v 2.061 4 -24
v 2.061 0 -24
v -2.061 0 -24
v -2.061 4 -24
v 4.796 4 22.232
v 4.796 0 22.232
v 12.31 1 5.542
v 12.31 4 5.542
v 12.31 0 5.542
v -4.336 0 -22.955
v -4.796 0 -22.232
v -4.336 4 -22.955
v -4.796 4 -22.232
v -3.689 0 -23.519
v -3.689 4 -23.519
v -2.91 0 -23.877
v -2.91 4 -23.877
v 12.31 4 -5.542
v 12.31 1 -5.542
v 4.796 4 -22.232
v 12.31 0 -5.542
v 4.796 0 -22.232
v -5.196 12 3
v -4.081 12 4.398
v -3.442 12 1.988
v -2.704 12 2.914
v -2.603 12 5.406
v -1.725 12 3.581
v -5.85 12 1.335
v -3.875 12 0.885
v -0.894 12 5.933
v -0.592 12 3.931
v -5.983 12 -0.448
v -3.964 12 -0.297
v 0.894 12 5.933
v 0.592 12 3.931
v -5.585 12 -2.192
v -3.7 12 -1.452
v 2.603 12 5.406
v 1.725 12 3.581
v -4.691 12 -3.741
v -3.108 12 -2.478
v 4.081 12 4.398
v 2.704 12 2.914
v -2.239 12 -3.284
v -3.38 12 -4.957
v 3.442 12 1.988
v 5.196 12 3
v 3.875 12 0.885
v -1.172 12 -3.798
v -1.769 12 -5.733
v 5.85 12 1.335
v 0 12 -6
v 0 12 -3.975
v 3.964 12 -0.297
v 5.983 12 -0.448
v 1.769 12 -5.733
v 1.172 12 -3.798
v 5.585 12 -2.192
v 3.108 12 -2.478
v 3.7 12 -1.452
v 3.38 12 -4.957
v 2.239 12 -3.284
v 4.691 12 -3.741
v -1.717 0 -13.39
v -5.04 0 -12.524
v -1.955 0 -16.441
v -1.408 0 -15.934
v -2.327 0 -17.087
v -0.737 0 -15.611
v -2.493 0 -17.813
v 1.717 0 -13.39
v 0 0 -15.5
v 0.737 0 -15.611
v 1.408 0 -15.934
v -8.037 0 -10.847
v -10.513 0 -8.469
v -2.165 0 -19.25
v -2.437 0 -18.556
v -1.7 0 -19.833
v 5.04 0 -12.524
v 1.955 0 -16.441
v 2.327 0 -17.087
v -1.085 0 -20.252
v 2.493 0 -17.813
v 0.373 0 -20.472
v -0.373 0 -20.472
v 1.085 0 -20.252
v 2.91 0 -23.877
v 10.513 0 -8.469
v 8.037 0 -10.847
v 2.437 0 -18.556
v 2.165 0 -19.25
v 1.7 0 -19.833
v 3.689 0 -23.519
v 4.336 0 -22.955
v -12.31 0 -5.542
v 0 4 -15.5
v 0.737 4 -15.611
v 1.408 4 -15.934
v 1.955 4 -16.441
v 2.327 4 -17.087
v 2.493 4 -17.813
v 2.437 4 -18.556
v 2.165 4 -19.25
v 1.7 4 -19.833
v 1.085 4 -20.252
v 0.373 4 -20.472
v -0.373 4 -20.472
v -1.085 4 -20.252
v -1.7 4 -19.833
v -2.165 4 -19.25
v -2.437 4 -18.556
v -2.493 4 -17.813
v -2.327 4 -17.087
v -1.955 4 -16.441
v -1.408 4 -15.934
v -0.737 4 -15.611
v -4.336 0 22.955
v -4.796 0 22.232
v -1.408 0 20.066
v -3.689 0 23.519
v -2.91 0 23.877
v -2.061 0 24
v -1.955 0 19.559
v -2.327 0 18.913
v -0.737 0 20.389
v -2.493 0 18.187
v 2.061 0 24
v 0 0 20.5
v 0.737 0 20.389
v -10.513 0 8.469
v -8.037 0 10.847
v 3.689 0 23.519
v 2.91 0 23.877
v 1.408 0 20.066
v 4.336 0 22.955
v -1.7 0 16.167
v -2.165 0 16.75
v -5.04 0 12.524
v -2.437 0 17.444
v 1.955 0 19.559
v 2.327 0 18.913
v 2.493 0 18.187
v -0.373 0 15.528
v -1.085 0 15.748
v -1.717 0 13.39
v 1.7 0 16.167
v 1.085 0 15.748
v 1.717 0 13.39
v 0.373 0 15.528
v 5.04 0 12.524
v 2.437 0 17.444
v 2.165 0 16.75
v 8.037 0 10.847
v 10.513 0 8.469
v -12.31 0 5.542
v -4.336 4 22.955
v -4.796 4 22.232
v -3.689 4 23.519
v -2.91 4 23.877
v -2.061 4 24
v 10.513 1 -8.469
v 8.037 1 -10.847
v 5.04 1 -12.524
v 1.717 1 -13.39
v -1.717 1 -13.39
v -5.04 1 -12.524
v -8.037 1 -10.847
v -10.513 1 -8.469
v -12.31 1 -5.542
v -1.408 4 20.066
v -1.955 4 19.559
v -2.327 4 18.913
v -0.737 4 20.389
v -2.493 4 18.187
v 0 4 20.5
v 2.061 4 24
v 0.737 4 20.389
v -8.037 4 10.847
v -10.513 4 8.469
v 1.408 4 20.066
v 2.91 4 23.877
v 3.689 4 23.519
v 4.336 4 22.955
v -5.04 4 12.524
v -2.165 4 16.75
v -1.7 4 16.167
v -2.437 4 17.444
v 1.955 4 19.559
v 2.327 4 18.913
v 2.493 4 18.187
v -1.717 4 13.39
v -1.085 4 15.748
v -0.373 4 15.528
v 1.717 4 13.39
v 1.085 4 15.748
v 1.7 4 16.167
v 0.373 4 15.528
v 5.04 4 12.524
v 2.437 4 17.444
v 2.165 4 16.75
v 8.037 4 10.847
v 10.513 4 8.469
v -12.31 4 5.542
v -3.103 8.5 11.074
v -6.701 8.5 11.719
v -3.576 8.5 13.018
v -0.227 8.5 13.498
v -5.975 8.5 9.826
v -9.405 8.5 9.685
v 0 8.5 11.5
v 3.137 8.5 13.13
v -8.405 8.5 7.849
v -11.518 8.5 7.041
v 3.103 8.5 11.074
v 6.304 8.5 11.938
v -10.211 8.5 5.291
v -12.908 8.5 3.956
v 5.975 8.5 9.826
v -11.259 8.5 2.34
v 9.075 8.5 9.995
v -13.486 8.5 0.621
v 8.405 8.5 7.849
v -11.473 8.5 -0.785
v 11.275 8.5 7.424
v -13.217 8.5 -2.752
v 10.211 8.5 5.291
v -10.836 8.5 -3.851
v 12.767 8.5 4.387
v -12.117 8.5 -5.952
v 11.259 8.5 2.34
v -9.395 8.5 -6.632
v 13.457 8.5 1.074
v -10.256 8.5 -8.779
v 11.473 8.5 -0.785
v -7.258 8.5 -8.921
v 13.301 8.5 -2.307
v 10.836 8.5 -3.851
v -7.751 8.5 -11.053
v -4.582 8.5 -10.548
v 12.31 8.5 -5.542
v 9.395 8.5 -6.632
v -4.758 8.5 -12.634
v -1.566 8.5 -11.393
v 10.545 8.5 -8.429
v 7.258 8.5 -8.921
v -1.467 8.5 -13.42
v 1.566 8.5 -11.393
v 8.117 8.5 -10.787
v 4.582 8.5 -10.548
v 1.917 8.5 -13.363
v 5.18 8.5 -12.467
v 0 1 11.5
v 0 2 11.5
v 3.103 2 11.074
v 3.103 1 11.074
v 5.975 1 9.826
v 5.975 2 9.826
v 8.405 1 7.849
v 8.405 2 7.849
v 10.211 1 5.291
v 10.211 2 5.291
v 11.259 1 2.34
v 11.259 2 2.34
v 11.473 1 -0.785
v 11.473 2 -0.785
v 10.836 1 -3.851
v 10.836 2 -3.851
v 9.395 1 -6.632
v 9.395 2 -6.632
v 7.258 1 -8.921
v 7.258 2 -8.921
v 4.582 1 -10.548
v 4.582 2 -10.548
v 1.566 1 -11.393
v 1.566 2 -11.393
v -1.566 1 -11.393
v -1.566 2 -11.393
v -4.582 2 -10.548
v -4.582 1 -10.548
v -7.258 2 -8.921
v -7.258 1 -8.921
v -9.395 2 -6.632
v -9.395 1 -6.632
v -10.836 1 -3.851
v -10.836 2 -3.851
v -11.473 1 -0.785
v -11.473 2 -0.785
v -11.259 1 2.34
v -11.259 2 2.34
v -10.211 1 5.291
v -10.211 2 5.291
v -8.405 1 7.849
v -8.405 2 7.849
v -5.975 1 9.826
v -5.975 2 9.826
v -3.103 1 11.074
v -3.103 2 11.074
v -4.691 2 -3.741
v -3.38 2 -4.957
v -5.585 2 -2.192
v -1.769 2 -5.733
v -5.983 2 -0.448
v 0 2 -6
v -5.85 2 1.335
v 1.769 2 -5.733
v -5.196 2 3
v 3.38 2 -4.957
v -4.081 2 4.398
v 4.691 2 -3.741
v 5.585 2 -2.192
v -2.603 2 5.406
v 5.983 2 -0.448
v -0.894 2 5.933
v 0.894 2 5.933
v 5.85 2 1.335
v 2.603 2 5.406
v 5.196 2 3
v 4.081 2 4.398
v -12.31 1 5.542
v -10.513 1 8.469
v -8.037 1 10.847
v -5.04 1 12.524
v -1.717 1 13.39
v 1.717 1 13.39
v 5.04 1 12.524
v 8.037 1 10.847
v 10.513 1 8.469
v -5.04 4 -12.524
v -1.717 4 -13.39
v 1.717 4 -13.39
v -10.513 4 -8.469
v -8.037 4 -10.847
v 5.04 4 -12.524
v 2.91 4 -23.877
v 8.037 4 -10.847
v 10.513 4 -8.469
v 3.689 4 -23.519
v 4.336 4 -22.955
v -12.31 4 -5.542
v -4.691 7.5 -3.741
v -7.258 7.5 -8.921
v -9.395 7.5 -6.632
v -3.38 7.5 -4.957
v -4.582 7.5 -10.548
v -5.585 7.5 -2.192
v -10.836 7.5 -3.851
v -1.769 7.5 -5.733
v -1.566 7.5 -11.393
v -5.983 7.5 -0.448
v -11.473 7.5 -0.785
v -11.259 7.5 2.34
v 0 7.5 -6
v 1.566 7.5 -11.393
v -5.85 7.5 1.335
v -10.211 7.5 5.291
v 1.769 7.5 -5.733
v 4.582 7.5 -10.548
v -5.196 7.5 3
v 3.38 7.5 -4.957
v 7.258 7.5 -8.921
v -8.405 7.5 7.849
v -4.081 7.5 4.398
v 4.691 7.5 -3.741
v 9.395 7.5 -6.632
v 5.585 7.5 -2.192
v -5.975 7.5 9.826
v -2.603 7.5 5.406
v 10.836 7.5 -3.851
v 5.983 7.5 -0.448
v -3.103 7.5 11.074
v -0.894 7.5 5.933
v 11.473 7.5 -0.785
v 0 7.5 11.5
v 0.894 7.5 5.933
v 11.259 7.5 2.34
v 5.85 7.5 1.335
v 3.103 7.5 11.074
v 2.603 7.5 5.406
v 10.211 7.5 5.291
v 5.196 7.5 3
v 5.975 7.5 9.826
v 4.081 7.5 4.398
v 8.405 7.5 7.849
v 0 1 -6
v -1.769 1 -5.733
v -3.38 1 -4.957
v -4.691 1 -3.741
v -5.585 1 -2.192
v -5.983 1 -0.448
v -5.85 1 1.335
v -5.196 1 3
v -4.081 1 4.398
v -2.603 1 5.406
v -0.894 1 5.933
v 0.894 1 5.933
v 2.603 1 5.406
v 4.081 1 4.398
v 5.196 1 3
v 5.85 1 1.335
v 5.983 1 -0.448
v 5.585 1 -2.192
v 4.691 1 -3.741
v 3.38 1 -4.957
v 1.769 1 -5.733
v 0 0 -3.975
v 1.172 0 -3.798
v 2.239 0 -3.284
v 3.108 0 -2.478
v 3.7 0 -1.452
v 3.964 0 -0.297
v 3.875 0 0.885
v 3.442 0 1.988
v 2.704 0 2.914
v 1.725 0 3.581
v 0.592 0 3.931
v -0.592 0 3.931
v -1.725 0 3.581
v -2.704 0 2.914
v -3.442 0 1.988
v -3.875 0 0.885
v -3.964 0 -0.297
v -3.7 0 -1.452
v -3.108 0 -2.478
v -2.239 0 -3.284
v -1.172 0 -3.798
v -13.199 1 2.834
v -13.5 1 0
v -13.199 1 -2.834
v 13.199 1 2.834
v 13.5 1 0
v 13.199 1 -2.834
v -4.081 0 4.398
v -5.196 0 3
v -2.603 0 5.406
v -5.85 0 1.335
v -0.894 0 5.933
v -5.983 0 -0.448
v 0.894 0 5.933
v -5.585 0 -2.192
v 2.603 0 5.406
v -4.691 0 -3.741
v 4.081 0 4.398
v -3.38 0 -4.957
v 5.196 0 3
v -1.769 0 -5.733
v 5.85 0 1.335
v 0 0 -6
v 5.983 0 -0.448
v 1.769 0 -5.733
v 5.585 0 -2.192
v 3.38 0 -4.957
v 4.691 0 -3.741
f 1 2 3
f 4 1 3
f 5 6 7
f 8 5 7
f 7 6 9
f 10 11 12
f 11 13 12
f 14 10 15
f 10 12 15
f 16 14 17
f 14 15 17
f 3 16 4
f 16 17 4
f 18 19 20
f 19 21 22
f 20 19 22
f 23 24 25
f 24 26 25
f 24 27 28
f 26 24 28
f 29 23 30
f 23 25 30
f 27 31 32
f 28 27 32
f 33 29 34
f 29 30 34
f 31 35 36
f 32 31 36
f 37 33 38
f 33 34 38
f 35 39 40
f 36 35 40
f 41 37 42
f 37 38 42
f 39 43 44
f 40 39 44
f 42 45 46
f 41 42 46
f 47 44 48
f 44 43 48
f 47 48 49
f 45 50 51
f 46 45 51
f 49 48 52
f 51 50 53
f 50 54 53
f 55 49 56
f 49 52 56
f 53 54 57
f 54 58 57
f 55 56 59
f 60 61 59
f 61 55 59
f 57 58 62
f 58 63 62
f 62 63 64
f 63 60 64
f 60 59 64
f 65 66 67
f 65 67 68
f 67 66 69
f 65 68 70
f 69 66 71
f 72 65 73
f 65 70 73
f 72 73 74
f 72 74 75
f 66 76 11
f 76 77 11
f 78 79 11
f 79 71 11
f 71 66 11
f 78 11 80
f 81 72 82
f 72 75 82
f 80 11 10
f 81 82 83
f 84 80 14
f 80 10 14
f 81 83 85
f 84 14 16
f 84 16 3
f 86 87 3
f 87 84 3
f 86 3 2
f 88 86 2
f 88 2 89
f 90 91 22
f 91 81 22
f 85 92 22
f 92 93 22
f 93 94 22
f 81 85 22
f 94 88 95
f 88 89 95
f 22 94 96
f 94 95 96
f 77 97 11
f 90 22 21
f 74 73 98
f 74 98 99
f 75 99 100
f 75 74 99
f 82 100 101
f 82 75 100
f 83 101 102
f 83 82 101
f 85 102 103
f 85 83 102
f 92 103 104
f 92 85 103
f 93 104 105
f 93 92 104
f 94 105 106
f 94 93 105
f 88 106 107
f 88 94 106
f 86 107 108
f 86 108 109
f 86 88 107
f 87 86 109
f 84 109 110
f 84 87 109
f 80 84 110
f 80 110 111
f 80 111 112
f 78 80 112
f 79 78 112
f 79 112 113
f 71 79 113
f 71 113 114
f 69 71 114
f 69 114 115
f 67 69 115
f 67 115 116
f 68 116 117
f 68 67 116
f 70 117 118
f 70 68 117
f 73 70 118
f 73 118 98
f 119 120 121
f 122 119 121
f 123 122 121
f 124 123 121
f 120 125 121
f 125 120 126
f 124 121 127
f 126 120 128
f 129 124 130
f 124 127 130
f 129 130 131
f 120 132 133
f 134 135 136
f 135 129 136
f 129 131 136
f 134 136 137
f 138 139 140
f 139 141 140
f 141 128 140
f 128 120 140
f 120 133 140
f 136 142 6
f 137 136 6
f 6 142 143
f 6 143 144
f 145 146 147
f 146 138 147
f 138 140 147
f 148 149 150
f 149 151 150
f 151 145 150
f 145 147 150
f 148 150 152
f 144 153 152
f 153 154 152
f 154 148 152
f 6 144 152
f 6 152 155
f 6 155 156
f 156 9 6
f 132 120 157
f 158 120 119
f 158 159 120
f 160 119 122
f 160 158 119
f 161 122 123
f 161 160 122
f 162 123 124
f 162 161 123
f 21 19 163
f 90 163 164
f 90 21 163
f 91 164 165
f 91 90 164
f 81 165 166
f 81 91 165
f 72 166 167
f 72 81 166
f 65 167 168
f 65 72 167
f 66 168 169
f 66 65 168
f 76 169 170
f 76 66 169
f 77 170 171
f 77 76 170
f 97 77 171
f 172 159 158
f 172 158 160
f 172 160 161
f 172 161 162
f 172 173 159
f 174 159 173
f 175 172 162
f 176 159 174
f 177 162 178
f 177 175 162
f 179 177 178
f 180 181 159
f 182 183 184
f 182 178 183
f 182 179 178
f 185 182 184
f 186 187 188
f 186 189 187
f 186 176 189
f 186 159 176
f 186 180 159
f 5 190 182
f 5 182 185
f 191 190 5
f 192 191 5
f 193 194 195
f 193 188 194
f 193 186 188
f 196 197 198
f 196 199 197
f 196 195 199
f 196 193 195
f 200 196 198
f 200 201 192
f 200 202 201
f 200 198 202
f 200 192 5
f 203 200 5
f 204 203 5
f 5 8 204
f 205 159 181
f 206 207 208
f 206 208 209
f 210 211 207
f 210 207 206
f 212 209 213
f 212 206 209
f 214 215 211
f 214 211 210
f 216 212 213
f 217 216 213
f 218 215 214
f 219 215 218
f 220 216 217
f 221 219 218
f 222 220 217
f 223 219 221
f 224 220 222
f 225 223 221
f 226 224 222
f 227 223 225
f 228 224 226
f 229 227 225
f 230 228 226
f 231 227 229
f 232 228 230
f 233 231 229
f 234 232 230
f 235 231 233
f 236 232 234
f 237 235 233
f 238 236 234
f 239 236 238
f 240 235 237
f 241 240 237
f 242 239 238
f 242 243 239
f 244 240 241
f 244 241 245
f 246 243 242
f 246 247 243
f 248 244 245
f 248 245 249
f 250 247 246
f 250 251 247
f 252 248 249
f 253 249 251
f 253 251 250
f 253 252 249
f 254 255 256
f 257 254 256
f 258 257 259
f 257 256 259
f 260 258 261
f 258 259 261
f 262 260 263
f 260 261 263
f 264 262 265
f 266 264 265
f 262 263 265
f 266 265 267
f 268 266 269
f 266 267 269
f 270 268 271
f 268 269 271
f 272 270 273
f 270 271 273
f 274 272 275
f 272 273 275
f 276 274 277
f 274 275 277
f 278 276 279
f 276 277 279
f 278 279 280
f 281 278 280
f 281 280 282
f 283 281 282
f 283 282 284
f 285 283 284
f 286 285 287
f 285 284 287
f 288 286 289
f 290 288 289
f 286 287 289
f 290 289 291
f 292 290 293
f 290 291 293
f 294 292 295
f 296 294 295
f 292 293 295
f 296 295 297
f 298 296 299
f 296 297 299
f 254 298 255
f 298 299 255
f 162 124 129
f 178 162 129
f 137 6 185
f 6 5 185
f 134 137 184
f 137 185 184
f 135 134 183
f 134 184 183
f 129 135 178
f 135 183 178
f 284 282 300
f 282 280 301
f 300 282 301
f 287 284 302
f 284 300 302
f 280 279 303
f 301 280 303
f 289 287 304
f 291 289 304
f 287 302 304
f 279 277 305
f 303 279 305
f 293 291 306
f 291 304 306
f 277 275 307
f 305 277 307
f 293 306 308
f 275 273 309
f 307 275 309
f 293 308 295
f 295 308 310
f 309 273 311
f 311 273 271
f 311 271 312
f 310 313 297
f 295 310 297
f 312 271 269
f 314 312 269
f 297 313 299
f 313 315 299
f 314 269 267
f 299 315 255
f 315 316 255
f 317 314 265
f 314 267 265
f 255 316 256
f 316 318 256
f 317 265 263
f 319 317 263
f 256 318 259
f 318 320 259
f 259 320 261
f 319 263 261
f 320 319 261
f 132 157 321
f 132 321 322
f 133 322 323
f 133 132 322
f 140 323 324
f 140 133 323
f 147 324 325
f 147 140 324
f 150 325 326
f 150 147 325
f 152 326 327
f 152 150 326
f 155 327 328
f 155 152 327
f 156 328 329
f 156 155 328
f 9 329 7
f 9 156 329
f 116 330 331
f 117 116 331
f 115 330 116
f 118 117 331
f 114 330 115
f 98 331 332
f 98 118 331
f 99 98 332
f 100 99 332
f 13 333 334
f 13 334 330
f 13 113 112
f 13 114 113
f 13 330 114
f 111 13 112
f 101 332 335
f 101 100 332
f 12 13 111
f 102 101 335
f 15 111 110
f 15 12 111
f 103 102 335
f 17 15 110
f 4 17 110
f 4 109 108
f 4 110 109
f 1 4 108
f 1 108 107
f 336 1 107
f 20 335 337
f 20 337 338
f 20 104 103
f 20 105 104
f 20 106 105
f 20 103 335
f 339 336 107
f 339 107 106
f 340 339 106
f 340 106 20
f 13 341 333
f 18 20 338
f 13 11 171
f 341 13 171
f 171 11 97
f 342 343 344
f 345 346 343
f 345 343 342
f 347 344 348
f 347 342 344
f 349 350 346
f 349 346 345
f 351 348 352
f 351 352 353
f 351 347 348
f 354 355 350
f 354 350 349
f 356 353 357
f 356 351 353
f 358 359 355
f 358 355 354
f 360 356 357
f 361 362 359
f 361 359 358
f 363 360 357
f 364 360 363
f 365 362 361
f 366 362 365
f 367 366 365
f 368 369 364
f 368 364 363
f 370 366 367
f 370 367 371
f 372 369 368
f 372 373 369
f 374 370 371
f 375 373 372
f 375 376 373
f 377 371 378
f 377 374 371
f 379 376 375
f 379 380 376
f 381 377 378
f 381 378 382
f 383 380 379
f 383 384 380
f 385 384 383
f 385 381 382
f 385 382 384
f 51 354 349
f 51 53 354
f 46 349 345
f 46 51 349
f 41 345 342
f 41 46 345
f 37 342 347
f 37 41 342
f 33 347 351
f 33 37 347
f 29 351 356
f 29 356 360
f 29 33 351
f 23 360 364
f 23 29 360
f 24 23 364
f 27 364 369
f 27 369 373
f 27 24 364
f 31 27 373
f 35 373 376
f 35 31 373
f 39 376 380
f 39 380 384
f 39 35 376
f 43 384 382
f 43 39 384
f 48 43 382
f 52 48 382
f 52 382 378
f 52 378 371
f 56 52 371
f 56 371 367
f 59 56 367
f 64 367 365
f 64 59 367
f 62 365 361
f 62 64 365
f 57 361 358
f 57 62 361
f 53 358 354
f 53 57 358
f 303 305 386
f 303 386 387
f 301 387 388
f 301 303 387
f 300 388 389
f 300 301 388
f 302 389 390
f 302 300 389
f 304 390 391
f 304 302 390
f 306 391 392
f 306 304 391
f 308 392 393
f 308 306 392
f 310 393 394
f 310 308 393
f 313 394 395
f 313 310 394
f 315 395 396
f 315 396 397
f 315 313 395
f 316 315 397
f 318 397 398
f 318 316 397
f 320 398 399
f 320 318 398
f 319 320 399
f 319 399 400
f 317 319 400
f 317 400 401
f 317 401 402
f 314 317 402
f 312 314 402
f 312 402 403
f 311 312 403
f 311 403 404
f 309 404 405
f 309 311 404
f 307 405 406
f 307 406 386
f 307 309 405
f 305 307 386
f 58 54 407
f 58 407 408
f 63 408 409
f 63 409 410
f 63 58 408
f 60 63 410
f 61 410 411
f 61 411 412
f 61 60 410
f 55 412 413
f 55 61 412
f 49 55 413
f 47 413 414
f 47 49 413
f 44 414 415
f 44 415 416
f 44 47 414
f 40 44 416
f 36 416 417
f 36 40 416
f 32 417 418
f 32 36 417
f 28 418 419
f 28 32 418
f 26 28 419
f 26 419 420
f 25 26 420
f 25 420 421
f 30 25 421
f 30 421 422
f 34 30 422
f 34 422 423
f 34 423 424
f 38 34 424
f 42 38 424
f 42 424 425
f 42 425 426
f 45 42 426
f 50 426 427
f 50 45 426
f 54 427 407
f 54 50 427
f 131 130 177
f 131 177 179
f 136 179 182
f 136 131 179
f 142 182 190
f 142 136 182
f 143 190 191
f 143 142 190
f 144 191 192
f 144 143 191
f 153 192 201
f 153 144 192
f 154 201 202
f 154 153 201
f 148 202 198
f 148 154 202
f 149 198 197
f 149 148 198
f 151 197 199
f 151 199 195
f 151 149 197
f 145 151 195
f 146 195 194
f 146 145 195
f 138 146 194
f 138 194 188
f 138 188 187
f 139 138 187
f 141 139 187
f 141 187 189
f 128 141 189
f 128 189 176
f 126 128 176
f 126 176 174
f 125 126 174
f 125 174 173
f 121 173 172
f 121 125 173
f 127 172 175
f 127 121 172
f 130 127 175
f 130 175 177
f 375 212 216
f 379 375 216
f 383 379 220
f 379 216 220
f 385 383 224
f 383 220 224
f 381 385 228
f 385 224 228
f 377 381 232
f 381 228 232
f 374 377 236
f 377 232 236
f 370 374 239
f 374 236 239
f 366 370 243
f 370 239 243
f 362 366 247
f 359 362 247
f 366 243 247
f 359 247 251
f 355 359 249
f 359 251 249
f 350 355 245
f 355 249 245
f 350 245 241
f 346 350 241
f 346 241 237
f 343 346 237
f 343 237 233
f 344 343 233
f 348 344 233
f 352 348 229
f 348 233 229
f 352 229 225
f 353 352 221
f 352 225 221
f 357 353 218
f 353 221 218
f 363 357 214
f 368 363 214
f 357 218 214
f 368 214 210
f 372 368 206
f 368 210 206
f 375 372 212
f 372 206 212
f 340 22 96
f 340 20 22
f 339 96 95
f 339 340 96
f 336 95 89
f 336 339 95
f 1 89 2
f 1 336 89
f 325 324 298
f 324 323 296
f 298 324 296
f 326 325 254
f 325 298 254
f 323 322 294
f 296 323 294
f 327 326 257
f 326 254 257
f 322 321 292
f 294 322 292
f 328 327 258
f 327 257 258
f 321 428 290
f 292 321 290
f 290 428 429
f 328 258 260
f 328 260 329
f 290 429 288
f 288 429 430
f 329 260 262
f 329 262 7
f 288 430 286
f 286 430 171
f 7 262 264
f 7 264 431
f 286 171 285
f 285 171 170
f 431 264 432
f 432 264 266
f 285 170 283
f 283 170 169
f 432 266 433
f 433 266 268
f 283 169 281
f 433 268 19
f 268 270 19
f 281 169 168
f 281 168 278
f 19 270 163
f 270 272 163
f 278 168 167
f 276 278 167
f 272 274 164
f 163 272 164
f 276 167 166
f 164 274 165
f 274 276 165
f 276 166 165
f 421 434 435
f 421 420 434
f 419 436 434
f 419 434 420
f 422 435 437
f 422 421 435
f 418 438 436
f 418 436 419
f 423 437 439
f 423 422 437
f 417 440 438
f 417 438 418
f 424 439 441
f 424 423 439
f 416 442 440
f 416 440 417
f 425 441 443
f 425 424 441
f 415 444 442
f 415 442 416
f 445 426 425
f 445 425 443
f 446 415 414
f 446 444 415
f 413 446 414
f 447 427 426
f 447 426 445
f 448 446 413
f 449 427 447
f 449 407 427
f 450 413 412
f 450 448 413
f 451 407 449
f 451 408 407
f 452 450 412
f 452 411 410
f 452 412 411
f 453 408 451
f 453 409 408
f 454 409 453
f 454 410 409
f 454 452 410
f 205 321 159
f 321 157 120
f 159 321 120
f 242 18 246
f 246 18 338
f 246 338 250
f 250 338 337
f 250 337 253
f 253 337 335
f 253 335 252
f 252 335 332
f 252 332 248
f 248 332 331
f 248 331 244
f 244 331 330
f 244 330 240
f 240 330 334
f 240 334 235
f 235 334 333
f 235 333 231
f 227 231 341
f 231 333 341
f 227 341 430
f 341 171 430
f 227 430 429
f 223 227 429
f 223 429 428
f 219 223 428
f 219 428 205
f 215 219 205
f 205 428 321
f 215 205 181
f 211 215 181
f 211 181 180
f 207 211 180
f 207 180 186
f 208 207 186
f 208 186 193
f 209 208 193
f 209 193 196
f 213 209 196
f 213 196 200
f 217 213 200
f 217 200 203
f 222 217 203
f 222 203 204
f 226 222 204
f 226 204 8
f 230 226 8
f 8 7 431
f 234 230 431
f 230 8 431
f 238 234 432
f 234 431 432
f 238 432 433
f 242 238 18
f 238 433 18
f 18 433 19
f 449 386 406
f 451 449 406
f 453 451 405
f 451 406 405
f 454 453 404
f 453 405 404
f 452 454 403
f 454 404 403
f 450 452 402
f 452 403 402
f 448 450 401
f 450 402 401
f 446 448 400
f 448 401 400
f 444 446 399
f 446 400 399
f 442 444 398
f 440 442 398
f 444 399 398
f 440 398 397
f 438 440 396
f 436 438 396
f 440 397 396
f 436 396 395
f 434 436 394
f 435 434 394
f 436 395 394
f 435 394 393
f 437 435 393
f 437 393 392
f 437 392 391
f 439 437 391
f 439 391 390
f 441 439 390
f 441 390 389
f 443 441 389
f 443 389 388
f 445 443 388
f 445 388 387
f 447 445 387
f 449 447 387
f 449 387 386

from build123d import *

# Parameters (mm, degrees)
SKETCH_1_R           = 2.5
SKETCH_1_R_2         = 13.5
SKETCH_1_R_3         = 4
EXTRUDE_1_DEPTH      = 4
SKETCH_1_3_R         = 13.5
SKETCH_1_3_R_2       = 4
EXTRUDE_2_DEPTH      = 8.5
SKETCH_1_5_R         = 13.5
SKETCH_1_5_R_2       = 4
CUT_EXTRUDE_1_DEPTH  = 1
EXTRUDE_4_DEPTH      = 1
EXTRUDE_4_DEPTH_BACK = 11
SKETCH_2_R           = 6
SKETCH_2_R_2         = 3.975020813
SKETCH_3_R           = 11.5
SKETCH_3_R_2         = 6
CUT_EXTRUDE_2_DEPTH  = 1
FILLET_1_R           = 3
CUT_EXTRUDE_START    = -6.5
SKETCH_3_2_R         = 11.5
SKETCH_3_2_R_2       = 6
CUT_EXTRUDE_3_DEPTH  = 1


with BuildPart() as part:
    # 草图1 → 凸台-拉伸1 (new body)
    # profile 1 of 3: a face of its own
    with BuildSketch(Plane(origin=(0, 0, 0), x_dir=(1, 0, 0), z_dir=(0, 1, 0))):
        with BuildLine():
            Line((4, 24), (-4, 24))
            Line((-4, 24), (-12.309965411, 5.542089098))
            ThreePointArc((-12.309965411, 5.542089098), (0, 13.5), (12.309965411, 5.542089098))
            Line((12.309965411, 5.542089098), (4, 24))
        make_face()
        with Locations(Location((0, 18, 0), (0, 0, 270))):
            Circle(SKETCH_1_R, mode=Mode.SUBTRACT)
    # profile 2 of 3: a face of its own
    with BuildSketch(Plane(origin=(0, 0, 0), x_dir=(1, 0, 0), z_dir=(0, 1, 0))):
        Circle(SKETCH_1_R_2)
        with Locations(Location((0, 0, 0), (0, 0, 270))):
            Circle(SKETCH_1_R_3, mode=Mode.SUBTRACT)
    # profile 3 of 3: a face of its own
    with BuildSketch(Plane(origin=(0, 0, 0), x_dir=(1, 0, 0), z_dir=(0, 1, 0))):
        with BuildLine():
            ThreePointArc((12.309965411, -5.542089098), (0, -13.5), (-12.309965411, -5.542089098))
            Line((-12.309965411, -5.542089098), (-4, -24))
            Line((-4, -24), (4, -24))
            Line((4, -24), (12.309965411, -5.542089098))
        make_face()
        with Locations(Location((0, -18, 0), (0, 0, 270))):
            Circle(SKETCH_1_R, mode=Mode.SUBTRACT)
    extrude(amount=EXTRUDE_1_DEPTH)

    # 草图1<3> → 凸台-拉伸2 (add)
    with BuildSketch(Plane(origin=(0, 0, 0), x_dir=(1, 0, 0), z_dir=(0, 1, 0))):
        with Locations(Location((0, 0, 0), (0, 0, 24.237826184))):
            Circle(SKETCH_1_3_R)
        with Locations(Location((0, 0, 0), (0, 0, 270))):
            Circle(SKETCH_1_3_R_2, mode=Mode.SUBTRACT)
    extrude(amount=EXTRUDE_2_DEPTH)

    # 草图1<5> → 切除-拉伸1 (cut)
    with BuildSketch(Plane(origin=(0, 0, 0), x_dir=(1, 0, 0), z_dir=(0, 1, 0))):
        with Locations(Location((0, 0, 0), (0, 0, 24.237826184))):
            Circle(SKETCH_1_5_R)
        with Locations(Location((0, 0, 0), (0, 0, 270))):
            Circle(SKETCH_1_5_R_2, mode=Mode.SUBTRACT)
    extrude(amount=CUT_EXTRUDE_1_DEPTH, mode=Mode.SUBTRACT)

    # 草图2 → 凸台-拉伸4 (add, two sides: drawn at the far end of the back side and taken through both)
    with BuildSketch(Plane.XZ.offset(-1).offset(-EXTRUDE_4_DEPTH_BACK)):
        with Locations(Location((0, 0, 0), (0, 0, 270))):
            Circle(SKETCH_2_R)
        with Locations(Location((0, 0, 0), (0, 0, 270))):
            Circle(SKETCH_2_R_2, mode=Mode.SUBTRACT)
    extrude(amount=EXTRUDE_4_DEPTH + EXTRUDE_4_DEPTH_BACK)

    # 草图3 → 切除-拉伸2 (cut)
    with BuildSketch(Plane(origin=(0, 8.5, 0), x_dir=(1, 0, 0), z_dir=(0, 1, 0))):
        with Locations(Location((0, 0, 0), (0, 0, 270))):
            Circle(SKETCH_3_R)
        with Locations(Location((0, 0, 0), (0, 0, 90))):
            Circle(SKETCH_3_R_2, mode=Mode.SUBTRACT)
    extrude(amount=-CUT_EXTRUDE_2_DEPTH, mode=Mode.SUBTRACT)

    # 圆角1
    fillet_1_edges = [part.edges().sort_by_distance(p)[0] for p in [
        (-4, 2, -24),
        (4, 2, -24),
        (4, 2, 24),
        (-4, 2, 24),
    ]]
    fillet(fillet_1_edges, radius=FILLET_1_R)

    # 草图3<2> → 切除-拉伸3 (cut)
    with BuildSketch(Plane(origin=(0, 8.5, 0), x_dir=(1, 0, 0), z_dir=(0, 1, 0)).offset(CUT_EXTRUDE_START)):
        with Locations(Location((0, 0, 0), (0, 0, 270))):
            Circle(SKETCH_3_2_R)
        with Locations(Location((0, 0, 0), (0, 0, 90))):
            Circle(SKETCH_3_2_R_2, mode=Mode.SUBTRACT)
    extrude(amount=-CUT_EXTRUDE_3_DEPTH, mode=Mode.SUBTRACT)


solid = part.part
